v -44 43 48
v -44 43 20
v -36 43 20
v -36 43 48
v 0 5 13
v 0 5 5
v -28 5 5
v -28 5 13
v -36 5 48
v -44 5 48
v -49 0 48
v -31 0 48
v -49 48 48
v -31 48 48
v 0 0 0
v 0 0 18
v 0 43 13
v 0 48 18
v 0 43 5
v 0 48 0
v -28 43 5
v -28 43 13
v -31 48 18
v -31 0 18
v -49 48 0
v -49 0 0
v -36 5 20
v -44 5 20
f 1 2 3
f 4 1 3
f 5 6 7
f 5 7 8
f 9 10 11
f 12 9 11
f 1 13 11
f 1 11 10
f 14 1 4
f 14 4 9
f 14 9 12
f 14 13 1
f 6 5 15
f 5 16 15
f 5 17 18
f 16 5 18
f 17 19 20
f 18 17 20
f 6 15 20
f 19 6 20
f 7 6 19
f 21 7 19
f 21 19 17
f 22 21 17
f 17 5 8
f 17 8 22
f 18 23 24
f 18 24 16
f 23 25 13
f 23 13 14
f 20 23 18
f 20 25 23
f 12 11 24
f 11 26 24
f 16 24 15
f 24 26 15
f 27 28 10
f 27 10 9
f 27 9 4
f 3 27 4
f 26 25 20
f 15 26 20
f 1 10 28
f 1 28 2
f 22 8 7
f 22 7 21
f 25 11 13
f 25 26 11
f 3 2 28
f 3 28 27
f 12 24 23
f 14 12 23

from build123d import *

# Parameters (mm, degrees)
F0_W     = 49
F0_H     = 48
F1_DEPTH = 18
F2_W     = 38
F2_H     = 8
F3_DEPTH = 28
F4_W     = 18
F4_H     = 48
F5_DEPTH = 30
F6_W     = 8
F6_H     = 38
F7_DEPTH = 28


with BuildPart() as f1:
    # F0 (on Top) → F1 (new body)
    with BuildSketch(Plane.XY):
        with Locations((-24.5, 24)):
            Rectangle(F0_W, F0_H)
    extrude(amount=F1_DEPTH)

    # F2 (on face) → F3 (cut)
    with BuildSketch(Plane.YZ):
        with Locations((24, 9)):
            Rectangle(F2_W, F2_H)
    extrude(amount=-F3_DEPTH, mode=Mode.SUBTRACT)

    # F4 (on face) → F5 (join)
    with BuildSketch(Plane.XY.offset(18)):
        with Locations((-40, 24)):
            Rectangle(F4_W, F4_H)
    extrude(amount=F5_DEPTH)

    # F6 (on face) → F7 (cut)
    with BuildSketch(Plane.XY.offset(48)):
        with Locations((-40, 24)):
            Rectangle(F6_W, F6_H)
    extrude(amount=-F7_DEPTH, mode=Mode.SUBTRACT)


solid = f1.part
